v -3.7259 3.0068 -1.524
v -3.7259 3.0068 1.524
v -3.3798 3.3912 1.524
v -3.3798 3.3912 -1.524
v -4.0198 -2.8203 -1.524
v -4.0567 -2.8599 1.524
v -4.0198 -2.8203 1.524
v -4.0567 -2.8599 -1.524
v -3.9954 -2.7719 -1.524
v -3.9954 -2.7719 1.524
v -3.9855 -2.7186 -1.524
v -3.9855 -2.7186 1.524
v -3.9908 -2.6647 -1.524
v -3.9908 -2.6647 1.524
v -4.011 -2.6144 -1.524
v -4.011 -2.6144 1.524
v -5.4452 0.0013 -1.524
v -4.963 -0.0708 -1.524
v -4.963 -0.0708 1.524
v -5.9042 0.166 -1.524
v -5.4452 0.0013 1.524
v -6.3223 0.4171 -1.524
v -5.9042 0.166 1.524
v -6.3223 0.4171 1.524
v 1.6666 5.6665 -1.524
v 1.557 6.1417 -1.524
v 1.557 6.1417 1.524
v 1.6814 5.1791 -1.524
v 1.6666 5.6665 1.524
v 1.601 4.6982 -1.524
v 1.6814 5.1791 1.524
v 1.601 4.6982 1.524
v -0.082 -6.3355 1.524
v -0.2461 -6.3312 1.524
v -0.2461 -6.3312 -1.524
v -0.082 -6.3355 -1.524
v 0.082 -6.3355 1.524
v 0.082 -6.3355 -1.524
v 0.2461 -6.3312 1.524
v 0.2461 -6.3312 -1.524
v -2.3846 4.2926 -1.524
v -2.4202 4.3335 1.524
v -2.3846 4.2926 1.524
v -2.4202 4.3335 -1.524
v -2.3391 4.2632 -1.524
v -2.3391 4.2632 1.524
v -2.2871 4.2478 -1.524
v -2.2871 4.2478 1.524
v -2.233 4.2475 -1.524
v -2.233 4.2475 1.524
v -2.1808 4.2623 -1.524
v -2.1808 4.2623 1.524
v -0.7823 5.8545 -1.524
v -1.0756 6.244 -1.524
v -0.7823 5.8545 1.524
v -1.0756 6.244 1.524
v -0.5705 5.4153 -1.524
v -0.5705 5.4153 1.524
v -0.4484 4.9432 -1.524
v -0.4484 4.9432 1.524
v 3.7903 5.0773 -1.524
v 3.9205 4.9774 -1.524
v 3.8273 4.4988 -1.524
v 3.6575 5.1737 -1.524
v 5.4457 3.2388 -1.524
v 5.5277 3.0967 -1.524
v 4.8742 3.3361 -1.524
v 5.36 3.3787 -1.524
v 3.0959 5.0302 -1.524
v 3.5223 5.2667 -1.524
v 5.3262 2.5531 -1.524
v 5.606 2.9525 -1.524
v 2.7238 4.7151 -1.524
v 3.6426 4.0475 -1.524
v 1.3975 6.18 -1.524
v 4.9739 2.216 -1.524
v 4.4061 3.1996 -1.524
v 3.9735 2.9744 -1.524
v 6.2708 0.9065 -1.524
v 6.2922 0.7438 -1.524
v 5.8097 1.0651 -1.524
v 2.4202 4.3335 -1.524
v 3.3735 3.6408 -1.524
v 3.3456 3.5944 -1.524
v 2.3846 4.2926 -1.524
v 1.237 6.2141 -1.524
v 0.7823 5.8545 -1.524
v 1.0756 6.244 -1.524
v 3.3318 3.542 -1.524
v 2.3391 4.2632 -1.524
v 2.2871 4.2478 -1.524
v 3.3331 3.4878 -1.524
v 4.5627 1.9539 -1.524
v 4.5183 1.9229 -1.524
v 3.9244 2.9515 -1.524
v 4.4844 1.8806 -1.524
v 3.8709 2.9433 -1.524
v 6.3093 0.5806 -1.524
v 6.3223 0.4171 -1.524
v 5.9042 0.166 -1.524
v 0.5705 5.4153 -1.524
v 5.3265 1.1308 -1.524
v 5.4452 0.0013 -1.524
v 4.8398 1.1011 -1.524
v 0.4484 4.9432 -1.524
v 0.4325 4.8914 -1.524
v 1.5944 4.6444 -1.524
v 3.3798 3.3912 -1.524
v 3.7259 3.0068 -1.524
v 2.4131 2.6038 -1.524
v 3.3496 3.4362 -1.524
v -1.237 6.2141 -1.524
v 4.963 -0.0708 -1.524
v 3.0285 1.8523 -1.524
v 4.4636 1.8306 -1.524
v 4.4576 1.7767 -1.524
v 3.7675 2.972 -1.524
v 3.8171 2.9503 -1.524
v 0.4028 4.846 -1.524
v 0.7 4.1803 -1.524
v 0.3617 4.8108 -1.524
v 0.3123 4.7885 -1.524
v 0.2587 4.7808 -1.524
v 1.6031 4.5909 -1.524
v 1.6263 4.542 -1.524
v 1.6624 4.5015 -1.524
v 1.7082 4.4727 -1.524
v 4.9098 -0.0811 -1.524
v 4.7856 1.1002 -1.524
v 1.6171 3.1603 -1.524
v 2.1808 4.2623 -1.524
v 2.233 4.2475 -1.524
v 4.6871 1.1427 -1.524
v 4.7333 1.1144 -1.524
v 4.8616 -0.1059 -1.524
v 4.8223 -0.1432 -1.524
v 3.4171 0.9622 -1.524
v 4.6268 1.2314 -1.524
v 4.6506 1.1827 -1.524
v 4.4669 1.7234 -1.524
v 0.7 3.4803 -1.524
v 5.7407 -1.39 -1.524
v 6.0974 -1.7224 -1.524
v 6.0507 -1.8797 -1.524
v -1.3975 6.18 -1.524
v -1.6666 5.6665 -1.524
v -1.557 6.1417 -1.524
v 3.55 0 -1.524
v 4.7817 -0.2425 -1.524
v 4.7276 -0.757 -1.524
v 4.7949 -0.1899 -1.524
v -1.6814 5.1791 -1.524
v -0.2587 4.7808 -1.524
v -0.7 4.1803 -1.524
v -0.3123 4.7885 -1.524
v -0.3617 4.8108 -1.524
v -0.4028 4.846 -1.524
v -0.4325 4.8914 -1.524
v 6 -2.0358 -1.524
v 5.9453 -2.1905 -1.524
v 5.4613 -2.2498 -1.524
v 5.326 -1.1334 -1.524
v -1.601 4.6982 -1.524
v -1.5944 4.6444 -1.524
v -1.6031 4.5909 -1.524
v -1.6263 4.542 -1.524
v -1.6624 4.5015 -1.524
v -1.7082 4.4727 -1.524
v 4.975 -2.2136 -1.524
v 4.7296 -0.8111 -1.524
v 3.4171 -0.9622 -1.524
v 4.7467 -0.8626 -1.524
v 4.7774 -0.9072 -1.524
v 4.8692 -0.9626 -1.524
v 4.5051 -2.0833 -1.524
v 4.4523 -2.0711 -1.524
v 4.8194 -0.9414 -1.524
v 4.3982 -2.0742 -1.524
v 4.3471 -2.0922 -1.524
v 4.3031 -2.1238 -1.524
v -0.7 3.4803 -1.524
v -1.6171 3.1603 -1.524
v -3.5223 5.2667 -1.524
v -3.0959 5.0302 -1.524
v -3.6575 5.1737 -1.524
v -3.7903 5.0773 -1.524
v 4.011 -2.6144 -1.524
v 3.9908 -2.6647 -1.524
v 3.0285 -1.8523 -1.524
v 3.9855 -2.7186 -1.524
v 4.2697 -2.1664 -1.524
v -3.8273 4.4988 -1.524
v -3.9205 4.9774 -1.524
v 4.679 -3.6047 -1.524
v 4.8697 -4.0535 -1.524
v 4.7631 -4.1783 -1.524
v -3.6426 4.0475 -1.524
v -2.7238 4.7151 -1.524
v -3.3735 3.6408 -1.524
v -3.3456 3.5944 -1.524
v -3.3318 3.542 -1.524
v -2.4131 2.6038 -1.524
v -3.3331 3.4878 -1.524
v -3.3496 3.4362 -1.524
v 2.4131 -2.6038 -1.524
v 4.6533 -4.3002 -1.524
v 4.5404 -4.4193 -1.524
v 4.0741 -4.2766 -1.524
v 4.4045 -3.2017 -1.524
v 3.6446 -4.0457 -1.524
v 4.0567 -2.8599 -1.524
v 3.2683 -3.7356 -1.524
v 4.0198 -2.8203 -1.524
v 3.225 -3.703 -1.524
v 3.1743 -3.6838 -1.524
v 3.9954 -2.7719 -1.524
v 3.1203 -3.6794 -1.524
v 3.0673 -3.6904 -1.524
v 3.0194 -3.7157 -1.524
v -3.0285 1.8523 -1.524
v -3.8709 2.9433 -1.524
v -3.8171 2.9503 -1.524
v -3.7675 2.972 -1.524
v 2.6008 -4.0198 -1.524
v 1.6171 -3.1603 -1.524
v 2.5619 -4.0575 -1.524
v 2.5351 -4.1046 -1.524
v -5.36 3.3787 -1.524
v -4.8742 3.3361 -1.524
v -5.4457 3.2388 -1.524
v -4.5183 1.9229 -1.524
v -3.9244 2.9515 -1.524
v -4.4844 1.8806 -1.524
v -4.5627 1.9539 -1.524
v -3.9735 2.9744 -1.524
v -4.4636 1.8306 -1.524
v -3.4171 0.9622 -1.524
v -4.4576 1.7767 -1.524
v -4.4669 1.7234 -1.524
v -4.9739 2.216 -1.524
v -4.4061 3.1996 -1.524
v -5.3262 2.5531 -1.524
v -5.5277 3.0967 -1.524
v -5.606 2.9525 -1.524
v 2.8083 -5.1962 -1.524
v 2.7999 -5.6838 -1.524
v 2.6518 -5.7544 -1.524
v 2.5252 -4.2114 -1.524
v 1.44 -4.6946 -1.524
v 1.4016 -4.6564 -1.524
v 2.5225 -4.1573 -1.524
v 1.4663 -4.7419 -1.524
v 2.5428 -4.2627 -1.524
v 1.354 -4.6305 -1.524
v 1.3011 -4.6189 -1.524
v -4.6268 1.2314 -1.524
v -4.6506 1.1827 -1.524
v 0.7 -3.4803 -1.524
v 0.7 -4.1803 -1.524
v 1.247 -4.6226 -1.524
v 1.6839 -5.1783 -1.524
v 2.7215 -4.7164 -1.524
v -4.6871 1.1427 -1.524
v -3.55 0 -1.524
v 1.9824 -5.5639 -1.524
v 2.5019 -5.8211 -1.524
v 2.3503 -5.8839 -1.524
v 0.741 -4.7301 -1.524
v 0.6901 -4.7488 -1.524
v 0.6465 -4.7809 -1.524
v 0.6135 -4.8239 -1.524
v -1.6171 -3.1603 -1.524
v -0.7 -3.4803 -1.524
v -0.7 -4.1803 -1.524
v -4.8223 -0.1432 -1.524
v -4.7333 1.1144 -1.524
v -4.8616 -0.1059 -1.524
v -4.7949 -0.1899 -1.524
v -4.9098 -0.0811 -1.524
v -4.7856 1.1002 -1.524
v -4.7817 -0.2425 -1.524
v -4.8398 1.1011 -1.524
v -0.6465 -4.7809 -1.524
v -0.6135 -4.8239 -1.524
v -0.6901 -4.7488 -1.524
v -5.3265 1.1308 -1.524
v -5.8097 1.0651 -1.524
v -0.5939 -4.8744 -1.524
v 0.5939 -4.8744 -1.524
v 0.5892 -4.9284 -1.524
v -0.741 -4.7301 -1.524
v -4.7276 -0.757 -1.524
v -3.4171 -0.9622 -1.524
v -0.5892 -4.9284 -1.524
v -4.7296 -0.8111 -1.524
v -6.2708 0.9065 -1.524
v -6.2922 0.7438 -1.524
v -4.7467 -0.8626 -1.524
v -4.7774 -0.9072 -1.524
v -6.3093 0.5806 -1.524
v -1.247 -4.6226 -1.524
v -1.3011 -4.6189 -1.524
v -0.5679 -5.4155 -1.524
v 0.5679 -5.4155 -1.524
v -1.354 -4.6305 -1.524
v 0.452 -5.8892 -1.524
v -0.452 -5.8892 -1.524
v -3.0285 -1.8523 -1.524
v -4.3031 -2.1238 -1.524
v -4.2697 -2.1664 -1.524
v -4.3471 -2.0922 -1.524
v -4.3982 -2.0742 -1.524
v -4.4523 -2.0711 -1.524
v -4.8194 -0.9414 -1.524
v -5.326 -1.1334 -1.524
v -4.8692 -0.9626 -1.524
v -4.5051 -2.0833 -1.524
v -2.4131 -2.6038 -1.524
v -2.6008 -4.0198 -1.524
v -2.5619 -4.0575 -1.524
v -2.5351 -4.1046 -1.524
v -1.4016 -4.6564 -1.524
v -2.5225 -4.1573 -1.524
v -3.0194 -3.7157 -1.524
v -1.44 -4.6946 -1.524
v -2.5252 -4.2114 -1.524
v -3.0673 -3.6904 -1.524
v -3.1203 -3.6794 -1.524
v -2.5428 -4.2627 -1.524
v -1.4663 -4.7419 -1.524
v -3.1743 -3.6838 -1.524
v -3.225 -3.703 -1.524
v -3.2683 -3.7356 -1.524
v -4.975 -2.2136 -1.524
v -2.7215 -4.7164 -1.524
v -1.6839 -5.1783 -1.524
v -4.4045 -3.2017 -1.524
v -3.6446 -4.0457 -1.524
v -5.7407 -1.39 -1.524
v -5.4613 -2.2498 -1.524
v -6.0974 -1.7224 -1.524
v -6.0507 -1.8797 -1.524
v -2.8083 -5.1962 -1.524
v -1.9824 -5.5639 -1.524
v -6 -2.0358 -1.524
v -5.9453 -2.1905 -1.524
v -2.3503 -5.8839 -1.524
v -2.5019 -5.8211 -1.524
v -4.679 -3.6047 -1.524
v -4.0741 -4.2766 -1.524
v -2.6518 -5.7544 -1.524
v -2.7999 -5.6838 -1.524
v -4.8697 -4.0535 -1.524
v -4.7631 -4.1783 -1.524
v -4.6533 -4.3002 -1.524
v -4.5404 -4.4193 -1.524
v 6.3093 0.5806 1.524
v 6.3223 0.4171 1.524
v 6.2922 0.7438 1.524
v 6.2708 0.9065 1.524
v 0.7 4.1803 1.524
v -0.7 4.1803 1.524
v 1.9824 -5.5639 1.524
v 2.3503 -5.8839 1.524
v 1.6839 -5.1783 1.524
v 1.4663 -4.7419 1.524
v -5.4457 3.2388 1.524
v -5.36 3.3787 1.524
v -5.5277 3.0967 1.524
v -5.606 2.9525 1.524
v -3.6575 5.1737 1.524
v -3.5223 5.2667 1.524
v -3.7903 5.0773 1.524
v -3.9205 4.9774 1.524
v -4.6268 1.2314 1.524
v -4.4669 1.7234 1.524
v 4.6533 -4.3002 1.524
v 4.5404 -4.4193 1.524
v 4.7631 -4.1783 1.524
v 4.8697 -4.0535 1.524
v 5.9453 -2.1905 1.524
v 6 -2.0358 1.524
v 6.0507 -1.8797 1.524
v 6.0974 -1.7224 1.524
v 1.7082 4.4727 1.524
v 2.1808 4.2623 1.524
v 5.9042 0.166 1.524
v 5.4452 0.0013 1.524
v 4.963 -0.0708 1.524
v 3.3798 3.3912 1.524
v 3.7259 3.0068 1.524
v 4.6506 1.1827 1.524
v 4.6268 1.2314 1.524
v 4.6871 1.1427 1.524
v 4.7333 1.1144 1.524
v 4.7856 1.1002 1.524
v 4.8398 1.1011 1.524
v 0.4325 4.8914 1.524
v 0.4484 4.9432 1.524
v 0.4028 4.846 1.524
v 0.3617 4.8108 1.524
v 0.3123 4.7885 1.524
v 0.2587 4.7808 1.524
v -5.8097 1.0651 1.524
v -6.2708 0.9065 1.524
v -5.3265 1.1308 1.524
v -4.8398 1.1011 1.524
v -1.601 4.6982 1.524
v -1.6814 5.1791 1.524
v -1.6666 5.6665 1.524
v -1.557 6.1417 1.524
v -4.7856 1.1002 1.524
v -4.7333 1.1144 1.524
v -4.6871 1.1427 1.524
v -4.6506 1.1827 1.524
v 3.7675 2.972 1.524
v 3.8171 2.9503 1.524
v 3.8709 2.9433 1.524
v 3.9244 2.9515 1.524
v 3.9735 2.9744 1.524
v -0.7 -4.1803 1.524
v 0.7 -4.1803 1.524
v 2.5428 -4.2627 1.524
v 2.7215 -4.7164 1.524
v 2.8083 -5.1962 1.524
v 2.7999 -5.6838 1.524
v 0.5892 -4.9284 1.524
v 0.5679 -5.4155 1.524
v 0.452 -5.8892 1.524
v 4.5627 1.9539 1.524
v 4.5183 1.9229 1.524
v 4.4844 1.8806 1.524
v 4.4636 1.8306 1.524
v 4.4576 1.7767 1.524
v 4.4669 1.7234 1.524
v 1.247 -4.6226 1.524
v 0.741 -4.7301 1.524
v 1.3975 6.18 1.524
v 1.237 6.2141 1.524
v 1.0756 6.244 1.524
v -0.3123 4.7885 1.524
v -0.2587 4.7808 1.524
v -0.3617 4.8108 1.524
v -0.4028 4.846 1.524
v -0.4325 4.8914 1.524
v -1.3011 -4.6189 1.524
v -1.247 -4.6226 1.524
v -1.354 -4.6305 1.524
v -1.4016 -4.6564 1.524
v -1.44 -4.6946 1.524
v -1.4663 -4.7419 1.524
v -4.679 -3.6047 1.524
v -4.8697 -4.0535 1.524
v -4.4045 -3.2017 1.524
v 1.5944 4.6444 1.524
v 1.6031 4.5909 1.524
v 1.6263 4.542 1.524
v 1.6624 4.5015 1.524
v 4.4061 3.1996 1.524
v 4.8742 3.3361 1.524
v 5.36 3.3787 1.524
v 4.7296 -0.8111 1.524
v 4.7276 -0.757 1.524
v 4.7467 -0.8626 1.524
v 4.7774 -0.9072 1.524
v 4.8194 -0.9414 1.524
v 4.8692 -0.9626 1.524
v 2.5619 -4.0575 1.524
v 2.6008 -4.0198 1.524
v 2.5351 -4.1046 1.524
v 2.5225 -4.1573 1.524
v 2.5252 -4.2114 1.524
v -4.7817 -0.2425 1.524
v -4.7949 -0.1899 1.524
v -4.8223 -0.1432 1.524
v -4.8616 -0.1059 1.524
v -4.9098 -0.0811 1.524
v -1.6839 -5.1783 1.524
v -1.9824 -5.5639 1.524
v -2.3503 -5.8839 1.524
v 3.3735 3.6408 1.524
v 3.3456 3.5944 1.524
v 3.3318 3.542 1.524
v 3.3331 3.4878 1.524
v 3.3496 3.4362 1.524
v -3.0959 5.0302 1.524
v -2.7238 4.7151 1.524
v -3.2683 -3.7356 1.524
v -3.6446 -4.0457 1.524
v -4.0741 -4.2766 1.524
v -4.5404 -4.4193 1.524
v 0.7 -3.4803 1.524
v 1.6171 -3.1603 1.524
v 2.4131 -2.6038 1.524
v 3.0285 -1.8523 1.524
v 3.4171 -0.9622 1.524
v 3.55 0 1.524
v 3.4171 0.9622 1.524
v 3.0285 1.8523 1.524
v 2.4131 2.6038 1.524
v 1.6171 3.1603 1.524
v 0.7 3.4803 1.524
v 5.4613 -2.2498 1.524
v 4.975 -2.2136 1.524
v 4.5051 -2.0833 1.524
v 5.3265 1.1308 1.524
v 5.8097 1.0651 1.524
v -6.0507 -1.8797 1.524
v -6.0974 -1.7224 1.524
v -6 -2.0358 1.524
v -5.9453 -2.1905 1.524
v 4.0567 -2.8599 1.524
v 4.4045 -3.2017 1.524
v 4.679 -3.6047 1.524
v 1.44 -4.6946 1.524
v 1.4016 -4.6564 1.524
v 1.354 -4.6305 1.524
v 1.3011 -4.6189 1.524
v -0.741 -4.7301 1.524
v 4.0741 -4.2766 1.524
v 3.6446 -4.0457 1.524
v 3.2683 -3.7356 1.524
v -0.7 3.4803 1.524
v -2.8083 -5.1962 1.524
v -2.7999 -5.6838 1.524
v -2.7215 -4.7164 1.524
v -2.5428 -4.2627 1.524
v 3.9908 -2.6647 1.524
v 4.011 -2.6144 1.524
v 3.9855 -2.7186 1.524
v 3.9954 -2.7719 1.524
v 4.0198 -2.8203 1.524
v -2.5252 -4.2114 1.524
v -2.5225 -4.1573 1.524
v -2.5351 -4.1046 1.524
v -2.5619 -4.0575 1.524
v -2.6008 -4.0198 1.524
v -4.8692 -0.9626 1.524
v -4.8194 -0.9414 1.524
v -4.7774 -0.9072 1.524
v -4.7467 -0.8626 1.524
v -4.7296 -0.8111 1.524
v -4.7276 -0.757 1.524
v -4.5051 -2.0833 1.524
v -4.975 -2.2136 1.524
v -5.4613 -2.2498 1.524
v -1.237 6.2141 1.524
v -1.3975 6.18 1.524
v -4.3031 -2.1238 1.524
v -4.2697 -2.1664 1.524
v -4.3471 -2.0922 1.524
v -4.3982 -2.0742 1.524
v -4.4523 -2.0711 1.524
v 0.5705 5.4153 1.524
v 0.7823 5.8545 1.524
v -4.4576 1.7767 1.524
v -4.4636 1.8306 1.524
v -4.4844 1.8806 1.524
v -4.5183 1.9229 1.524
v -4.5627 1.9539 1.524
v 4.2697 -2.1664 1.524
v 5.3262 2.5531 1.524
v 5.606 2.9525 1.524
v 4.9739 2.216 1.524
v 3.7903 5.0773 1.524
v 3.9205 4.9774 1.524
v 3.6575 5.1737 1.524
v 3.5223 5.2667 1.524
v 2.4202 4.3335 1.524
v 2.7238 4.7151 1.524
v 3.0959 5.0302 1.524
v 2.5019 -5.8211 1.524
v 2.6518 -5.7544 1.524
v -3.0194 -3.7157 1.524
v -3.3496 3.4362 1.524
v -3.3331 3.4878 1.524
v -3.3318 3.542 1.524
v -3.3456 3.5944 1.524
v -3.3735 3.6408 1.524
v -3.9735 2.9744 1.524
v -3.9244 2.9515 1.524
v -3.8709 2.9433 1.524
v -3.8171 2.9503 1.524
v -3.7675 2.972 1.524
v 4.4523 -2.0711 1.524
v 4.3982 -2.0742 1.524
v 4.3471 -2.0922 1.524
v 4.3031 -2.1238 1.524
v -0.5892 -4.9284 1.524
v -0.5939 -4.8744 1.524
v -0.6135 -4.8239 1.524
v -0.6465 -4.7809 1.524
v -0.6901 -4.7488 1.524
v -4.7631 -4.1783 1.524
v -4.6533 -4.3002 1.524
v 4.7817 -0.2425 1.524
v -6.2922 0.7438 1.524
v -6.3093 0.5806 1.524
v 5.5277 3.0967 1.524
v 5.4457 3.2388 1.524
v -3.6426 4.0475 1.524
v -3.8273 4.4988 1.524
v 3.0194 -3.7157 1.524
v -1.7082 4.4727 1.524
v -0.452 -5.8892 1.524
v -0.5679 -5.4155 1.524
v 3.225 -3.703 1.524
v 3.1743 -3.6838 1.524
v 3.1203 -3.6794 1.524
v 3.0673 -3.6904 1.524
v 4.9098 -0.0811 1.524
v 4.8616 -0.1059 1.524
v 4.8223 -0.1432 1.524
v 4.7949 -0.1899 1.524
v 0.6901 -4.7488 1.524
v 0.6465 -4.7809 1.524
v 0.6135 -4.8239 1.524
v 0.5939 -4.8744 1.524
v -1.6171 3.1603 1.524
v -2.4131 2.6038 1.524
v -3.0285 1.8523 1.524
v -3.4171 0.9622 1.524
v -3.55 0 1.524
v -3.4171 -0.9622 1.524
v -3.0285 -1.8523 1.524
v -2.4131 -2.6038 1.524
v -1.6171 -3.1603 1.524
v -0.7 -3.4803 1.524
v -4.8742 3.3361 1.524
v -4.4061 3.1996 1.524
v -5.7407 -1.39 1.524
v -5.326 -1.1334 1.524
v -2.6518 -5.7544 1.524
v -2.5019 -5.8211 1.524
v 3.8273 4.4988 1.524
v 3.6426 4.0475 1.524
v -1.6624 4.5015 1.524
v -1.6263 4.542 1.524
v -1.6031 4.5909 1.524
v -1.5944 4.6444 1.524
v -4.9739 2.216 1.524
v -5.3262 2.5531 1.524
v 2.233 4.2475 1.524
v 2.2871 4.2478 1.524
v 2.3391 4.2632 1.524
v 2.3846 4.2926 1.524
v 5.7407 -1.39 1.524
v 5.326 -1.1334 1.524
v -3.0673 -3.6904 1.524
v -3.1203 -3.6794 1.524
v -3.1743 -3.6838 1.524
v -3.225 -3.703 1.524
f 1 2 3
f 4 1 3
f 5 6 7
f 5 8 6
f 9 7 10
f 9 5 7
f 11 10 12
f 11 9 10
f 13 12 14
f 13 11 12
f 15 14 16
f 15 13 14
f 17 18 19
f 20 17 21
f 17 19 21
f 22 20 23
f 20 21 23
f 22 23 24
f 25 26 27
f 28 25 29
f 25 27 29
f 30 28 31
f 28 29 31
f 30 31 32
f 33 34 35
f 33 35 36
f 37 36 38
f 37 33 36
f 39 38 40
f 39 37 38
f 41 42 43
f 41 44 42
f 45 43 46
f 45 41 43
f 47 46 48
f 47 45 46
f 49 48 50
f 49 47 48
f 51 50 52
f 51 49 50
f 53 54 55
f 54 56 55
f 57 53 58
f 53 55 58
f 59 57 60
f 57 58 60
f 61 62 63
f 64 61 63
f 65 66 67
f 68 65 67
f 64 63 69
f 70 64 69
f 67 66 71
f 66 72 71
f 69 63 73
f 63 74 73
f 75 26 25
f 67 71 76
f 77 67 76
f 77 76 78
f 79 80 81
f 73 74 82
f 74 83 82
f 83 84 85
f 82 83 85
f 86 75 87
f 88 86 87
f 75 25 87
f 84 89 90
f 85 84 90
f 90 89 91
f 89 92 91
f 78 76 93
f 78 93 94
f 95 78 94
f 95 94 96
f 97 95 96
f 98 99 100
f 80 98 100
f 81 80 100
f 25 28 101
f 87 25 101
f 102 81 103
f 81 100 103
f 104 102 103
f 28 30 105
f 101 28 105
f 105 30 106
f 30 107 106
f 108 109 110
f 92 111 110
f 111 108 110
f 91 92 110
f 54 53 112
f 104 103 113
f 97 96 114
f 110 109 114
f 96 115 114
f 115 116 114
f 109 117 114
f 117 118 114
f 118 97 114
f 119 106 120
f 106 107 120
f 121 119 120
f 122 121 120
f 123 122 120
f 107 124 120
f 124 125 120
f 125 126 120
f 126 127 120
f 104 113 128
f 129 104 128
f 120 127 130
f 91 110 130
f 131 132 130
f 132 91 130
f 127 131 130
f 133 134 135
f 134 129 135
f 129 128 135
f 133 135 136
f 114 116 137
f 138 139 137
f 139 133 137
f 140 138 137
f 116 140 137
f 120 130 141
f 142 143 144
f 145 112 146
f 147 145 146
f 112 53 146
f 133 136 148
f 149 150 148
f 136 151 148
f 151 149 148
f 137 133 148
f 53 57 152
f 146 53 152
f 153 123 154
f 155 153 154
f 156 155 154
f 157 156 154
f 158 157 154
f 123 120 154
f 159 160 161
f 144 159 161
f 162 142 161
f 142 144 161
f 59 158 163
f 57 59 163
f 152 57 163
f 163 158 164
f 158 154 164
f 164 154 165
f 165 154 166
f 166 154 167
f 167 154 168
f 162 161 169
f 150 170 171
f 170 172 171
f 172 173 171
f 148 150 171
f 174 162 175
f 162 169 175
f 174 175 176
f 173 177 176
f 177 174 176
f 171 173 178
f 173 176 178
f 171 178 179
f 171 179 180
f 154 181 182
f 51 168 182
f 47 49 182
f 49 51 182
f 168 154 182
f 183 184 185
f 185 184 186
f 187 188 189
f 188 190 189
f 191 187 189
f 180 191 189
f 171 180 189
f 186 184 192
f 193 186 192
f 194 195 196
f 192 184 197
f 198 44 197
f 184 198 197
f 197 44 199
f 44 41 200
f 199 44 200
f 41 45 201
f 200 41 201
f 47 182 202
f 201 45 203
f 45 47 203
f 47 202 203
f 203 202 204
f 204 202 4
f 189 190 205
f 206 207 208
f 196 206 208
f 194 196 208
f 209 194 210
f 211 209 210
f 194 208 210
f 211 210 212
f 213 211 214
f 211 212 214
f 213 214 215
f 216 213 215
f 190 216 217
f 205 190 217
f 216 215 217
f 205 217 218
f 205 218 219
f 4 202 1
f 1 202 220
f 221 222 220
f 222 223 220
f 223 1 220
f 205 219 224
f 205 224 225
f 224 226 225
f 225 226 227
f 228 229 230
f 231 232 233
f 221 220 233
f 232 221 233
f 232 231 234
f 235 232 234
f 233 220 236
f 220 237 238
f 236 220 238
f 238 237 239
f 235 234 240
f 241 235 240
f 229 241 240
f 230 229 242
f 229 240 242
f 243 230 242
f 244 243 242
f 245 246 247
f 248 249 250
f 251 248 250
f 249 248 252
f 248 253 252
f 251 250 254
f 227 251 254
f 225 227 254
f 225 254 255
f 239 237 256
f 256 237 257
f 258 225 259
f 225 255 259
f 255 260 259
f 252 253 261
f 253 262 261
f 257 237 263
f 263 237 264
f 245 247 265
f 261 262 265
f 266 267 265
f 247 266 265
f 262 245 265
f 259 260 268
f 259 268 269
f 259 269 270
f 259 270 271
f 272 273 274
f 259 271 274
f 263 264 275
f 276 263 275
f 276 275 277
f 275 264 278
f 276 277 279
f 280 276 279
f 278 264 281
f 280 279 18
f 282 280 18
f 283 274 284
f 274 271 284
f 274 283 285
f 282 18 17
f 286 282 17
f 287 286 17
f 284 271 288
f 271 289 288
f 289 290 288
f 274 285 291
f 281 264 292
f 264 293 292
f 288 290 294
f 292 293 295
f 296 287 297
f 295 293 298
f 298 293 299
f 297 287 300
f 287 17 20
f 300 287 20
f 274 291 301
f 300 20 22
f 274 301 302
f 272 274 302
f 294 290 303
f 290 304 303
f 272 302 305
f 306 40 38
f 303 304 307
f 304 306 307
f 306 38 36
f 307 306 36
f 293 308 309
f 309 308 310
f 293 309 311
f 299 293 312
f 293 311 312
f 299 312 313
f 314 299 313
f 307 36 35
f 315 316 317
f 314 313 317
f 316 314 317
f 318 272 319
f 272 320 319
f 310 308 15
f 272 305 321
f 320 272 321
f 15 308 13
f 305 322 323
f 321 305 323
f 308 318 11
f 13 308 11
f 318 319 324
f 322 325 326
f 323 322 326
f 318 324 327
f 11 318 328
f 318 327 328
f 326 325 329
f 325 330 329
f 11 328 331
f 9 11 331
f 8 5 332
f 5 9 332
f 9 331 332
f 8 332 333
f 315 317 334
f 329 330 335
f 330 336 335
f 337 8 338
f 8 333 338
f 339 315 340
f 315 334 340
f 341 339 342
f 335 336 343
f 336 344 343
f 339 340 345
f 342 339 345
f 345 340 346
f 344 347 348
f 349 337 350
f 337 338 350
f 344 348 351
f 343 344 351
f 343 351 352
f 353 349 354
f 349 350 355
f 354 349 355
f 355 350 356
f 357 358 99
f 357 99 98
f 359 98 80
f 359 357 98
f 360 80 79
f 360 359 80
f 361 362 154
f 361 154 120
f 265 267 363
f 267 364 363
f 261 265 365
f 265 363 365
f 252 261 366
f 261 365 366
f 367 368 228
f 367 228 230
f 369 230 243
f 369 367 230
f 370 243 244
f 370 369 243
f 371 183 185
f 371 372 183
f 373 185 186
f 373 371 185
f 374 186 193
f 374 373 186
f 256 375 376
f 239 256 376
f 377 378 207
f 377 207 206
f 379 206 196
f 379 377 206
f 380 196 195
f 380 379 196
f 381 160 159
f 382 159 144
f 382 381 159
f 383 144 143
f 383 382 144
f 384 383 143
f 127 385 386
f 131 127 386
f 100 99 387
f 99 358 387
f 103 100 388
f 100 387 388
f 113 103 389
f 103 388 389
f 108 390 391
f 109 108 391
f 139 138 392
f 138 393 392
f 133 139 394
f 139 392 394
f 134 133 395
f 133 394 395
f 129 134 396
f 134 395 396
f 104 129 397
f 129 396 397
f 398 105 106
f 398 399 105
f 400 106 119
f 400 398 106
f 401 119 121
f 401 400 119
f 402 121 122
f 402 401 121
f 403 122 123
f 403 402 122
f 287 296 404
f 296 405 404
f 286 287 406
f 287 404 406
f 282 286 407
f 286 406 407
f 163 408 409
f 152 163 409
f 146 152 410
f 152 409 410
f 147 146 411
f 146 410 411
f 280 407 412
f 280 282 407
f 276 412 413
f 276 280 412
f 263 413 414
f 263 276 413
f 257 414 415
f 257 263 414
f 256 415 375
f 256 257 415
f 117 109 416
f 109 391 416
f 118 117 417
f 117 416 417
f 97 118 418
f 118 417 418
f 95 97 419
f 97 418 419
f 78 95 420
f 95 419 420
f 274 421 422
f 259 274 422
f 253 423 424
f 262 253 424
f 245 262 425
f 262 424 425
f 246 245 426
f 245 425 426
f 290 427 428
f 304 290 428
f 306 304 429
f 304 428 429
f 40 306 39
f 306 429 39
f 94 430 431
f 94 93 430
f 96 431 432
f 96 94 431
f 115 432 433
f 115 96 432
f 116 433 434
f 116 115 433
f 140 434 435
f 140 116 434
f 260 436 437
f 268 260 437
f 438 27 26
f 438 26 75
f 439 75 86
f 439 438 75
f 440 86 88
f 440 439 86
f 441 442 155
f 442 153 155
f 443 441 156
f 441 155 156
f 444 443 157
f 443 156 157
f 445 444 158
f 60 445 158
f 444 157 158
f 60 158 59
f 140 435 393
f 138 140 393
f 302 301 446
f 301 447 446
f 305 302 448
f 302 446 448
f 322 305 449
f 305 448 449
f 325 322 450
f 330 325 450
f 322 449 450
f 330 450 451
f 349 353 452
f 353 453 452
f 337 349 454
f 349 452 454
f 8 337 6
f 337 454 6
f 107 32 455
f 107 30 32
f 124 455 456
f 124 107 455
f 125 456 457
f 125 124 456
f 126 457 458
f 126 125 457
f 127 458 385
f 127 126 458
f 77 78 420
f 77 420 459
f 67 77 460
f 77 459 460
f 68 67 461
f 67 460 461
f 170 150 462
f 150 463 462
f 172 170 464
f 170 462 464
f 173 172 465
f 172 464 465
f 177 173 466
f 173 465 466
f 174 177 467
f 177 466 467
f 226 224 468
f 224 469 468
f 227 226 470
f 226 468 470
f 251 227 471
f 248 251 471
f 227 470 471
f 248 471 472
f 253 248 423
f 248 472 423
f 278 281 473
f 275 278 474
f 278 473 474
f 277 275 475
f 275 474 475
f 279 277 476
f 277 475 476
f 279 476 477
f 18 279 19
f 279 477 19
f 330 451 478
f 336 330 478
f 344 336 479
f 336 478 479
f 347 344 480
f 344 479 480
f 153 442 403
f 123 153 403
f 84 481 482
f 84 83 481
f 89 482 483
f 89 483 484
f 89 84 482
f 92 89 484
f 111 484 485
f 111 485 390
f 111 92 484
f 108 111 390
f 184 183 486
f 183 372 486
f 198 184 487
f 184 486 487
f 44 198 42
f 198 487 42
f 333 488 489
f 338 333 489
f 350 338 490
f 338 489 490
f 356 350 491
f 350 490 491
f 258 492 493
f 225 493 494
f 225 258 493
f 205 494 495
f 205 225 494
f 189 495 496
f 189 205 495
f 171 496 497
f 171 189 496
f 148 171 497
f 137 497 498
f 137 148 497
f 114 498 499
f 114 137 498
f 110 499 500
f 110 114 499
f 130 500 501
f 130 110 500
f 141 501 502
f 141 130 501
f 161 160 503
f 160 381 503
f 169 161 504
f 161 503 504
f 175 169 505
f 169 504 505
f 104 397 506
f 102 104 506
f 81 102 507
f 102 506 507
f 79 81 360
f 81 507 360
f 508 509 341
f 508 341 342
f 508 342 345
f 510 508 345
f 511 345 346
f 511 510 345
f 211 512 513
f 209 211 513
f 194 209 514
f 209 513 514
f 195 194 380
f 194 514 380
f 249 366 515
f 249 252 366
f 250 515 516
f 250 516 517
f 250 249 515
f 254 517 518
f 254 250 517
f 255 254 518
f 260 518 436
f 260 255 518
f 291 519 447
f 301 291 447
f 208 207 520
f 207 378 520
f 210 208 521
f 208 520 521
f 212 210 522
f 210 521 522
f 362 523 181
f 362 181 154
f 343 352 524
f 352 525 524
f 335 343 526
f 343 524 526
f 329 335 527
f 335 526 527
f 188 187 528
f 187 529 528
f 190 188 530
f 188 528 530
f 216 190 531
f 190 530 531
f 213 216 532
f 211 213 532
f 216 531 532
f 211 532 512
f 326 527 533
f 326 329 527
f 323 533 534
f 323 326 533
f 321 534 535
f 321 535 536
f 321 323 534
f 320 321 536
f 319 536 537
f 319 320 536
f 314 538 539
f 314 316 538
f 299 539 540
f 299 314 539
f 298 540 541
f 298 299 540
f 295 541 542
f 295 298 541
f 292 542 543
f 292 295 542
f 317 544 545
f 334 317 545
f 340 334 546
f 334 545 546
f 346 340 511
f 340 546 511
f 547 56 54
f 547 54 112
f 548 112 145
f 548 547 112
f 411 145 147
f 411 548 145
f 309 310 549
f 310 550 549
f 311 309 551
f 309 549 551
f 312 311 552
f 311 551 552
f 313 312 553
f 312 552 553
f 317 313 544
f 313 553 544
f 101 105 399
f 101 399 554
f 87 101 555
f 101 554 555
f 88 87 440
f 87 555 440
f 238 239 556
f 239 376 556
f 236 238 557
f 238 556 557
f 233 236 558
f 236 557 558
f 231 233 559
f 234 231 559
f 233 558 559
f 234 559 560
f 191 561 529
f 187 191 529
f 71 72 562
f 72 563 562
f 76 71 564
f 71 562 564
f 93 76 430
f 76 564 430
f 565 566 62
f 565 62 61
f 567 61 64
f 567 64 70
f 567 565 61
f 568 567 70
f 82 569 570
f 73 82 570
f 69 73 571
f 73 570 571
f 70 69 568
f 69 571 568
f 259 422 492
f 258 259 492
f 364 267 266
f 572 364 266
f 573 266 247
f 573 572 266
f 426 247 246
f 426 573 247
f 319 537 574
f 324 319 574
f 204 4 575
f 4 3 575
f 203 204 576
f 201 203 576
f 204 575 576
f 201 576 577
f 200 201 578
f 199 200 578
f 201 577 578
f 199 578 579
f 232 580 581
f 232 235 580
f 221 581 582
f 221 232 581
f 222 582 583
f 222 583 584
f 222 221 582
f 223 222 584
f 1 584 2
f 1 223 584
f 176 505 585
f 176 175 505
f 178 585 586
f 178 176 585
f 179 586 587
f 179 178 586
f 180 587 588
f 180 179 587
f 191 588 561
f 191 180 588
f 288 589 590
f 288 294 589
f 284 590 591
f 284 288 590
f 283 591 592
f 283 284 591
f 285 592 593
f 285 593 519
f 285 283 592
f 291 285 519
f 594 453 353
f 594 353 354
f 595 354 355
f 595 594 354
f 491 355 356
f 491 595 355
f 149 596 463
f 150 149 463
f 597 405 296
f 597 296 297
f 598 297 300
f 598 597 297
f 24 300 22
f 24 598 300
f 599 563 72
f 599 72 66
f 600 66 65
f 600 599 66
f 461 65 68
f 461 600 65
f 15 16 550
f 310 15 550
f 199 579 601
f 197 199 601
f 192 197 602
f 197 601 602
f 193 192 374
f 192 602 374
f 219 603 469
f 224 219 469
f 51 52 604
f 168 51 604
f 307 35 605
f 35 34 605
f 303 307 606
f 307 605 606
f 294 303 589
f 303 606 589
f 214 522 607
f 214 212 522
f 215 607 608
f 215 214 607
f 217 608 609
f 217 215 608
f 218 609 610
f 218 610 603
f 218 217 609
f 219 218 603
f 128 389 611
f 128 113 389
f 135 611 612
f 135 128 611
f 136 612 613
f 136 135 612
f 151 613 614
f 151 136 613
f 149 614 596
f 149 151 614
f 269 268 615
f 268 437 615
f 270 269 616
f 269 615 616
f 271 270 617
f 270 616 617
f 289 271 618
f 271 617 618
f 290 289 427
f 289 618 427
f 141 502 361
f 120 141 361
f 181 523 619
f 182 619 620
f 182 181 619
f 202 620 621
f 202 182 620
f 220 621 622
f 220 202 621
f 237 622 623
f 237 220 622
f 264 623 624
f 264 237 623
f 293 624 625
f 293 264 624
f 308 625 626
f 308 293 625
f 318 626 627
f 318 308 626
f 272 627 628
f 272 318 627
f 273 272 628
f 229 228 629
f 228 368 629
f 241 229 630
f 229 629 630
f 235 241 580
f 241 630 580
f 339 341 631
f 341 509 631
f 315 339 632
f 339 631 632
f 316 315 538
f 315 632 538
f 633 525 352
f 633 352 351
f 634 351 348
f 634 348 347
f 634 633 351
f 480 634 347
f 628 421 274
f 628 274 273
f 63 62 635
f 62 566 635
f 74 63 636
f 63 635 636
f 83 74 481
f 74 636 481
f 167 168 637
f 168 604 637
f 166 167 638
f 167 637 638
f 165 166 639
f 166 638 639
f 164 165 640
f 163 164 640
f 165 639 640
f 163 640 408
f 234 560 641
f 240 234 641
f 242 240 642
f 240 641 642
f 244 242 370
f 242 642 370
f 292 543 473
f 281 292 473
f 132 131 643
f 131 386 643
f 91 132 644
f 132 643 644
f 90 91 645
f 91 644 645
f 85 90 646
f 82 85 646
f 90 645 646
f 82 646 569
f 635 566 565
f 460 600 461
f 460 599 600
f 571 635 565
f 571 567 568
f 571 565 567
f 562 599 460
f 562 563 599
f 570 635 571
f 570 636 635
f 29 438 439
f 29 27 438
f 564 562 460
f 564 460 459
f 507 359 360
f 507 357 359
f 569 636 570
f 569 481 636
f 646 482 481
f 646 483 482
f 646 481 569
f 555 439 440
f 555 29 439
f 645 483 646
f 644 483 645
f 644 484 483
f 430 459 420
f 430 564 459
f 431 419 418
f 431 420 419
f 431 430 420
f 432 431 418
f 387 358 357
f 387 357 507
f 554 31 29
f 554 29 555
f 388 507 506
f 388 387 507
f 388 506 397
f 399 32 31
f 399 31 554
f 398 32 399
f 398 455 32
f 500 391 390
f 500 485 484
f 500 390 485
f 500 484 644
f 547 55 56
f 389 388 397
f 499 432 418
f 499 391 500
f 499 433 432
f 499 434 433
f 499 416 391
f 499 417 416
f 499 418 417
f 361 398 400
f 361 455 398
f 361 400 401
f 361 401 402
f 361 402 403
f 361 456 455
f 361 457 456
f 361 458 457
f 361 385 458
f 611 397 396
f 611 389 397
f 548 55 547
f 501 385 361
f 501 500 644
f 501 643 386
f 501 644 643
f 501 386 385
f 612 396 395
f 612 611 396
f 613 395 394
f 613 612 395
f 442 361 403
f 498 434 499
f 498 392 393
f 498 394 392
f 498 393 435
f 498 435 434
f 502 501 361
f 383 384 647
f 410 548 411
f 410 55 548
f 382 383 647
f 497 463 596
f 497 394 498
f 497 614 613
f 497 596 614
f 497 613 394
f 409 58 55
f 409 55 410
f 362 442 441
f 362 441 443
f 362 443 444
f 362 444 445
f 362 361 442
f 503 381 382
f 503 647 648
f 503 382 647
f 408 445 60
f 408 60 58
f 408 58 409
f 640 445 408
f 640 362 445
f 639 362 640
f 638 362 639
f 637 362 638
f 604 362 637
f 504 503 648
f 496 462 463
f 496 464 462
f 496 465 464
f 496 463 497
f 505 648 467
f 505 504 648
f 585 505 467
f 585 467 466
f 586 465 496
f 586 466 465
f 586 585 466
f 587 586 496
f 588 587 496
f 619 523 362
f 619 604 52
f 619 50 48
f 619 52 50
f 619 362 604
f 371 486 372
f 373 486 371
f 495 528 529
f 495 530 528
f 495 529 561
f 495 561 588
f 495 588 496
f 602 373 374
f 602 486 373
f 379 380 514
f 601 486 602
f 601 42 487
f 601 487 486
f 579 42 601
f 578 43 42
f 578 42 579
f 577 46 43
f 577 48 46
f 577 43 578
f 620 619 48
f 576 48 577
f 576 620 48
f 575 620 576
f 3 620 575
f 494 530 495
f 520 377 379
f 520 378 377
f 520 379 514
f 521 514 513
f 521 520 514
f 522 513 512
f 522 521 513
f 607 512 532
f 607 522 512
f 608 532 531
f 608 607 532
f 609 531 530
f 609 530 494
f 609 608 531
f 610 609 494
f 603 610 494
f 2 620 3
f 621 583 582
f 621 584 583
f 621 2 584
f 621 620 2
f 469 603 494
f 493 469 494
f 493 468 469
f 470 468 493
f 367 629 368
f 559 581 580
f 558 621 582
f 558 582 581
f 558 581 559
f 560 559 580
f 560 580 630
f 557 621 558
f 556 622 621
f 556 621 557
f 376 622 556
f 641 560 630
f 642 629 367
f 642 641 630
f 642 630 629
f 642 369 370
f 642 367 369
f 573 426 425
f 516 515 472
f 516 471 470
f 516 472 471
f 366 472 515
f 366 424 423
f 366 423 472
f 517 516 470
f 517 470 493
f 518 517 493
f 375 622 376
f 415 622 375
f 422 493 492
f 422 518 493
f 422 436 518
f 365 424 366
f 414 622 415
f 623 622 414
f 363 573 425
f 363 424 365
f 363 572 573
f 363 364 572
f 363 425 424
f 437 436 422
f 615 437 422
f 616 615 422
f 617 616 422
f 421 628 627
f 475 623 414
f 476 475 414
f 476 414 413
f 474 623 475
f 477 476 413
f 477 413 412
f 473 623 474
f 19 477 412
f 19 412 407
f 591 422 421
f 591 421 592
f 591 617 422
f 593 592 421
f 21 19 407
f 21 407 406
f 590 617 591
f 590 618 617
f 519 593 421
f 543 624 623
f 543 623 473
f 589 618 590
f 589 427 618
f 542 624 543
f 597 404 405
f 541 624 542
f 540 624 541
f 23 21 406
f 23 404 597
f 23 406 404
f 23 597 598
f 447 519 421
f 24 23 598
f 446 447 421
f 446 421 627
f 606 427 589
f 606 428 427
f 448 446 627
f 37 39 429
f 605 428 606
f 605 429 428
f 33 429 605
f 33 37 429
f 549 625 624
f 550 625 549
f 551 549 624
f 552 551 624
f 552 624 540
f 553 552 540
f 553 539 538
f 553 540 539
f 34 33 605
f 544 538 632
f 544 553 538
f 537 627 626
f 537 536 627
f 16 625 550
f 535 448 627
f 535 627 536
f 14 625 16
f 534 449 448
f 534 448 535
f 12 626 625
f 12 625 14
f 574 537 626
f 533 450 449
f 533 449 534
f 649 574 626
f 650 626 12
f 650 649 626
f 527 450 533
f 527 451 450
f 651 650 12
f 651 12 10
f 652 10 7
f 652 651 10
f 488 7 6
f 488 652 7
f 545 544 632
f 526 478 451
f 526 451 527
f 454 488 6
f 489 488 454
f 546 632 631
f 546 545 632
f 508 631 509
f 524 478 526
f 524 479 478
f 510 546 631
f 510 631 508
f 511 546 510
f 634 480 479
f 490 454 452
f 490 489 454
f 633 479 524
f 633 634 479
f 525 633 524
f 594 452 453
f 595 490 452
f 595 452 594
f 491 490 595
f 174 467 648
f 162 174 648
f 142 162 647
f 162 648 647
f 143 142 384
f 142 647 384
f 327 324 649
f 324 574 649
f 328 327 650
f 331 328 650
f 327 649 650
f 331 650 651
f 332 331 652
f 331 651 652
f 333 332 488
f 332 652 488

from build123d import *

# Parameters (mm, degrees)
SKETCH1_R                = 6.335999901
BOSS_EXTRUDE1_DEPTH      = 1.524
CUT_EXTRUDE1_DEPTH       = 10.089134474
FILLET1_R                = 0.191999997
CIRPATTERN1_COUNT        = 15
FILLET1_OF_CIRPATTERN1_R = 0.191999997
CUT_EXTRUDE2_DEPTH       = 10.455482489
CUT_EXTRUDE2_DEPTH_BACK  = 10.455482489
SKETCH4_R                = 3.55
SKETCH6_W                = 1.4
SKETCH6_H                = 0.7
CUT_EXTRUDE3_DEPTH       = 10.455482489


with BuildPart() as part:
    # Sketch1 → Boss-Extrude1 (new, symmetric)
    with BuildSketch(Plane.XY):
        with Locations(Location((0, 0, 0), (0, 0, 180))):
            Circle(SKETCH1_R)
    extrude(amount=BOSS_EXTRUDE1_DEPTH, both=True)

    # Sketch3 → Cut-Extrude1 (cut, symmetric)
    with BuildSketch(Plane.XY):
        with BuildLine():
            Line((-0.428414679, 4.780843037), (0.428414679, 4.780843037))
            ThreePointArc((0.428414679, 4.780843037), (1.010780942, 6.170659573), (2.288190337, 6.970012879))
            ThreePointArc((2.288190337, 6.970012879), (0, 7.335999901), (-2.288190337, 6.970012879))
            ThreePointArc((-2.288190337, 6.970012879), (-1.010780942, 6.170659573), (-0.428414679, 4.780843037))
        make_face()
    cut_extrude1 = extrude(amount=CUT_EXTRUDE1_DEPTH, both=True, mode=Mode.SUBTRACT)

    # Fillet1
    fillet1_edges = [part.edges().sort_by_distance(p)[0] for p in [
        (-0.428414679, 4.780843037, 0),
        (0.428414679, 4.780843037, 0),
    ]]
    fillet(fillet1_edges, radius=FILLET1_R)

    # CirPattern1: Cut-Extrude1 ×15 about axis
    cirpattern1_axis = Axis((0, 0, 0), (0, 0, 1))
    for i in range(1, CIRPATTERN1_COUNT):
        add(cut_extrude1.rotate(cirpattern1_axis, i * 360 / CIRPATTERN1_COUNT), mode=Mode.SUBTRACT)

    # Fillet1 of CirPattern1
    fillet1_of_cirpattern1_edges = [part.edges().sort_by_distance(p)[0] for p in [
        (-2.335920332, 4.193265492, 0),
        (-1.553167764, 4.541769388, 0),
        (-3.839524138, 2.880634248, 0),
        (-3.26619339, 3.517382552, 0),
        (-4.67923934, 1.069915174, 0),
        (-4.414464507, 1.884808318, 0),
        (-4.70987155, -0.925801954, 0),
        (-4.799434606, -0.073666397, 0),
        (-3.926124182, -2.761439514, 0),
        (-4.354538861, -2.019403523, 0),
        (-2.463514275, -4.119599094, 0),
        (-3.156703787, -3.615967434, 0),
        (-0.574940369, -4.765442566, 0),
        (-1.41304595, -4.587297726, 0),
        (1.41304595, -4.587297726, 0),
        (0.574940369, -4.765442566, 0),
        (3.156703787, -3.615967434, 0),
        (2.463514275, -4.119599094, 0),
        (4.354538861, -2.019403523, 0),
        (3.926124182, -2.761439514, 0),
        (4.799434606, -0.073666397, 0),
        (4.70987155, -0.925801954, 0),
        (4.414464507, 1.884808318, 0),
        (4.67923934, 1.069915174, 0),
        (3.26619339, 3.517382552, 0),
        (3.839524138, 2.880634248, 0),
        (1.553167764, 4.541769388, 0),
        (2.335920332, 4.193265492, 0),
    ]]
    fillet(fillet1_of_cirpattern1_edges, radius=FILLET1_OF_CIRPATTERN1_R)

    # Sketch4 → Cut-Extrude2 (cut, two sides: drawn at the far end of the back side and taken through both)
    with BuildSketch(Plane.XY.offset(1.524).offset(-CUT_EXTRUDE2_DEPTH_BACK)):
        Circle(SKETCH4_R)
    extrude(amount=CUT_EXTRUDE2_DEPTH + CUT_EXTRUDE2_DEPTH_BACK, mode=Mode.SUBTRACT)

    # Sketch6 → Cut-Extrude3 (cut, through all)
    with BuildSketch(Plane.XY.offset(1.524)):
        with Locations((0, 3.830301711)):
            Rectangle(SKETCH6_W, SKETCH6_H)
        with Locations((0, -3.830301711)):
            Rectangle(SKETCH6_W, SKETCH6_H)
    extrude(amount=-CUT_EXTRUDE3_DEPTH, mode=Mode.SUBTRACT)


solid = part.part
